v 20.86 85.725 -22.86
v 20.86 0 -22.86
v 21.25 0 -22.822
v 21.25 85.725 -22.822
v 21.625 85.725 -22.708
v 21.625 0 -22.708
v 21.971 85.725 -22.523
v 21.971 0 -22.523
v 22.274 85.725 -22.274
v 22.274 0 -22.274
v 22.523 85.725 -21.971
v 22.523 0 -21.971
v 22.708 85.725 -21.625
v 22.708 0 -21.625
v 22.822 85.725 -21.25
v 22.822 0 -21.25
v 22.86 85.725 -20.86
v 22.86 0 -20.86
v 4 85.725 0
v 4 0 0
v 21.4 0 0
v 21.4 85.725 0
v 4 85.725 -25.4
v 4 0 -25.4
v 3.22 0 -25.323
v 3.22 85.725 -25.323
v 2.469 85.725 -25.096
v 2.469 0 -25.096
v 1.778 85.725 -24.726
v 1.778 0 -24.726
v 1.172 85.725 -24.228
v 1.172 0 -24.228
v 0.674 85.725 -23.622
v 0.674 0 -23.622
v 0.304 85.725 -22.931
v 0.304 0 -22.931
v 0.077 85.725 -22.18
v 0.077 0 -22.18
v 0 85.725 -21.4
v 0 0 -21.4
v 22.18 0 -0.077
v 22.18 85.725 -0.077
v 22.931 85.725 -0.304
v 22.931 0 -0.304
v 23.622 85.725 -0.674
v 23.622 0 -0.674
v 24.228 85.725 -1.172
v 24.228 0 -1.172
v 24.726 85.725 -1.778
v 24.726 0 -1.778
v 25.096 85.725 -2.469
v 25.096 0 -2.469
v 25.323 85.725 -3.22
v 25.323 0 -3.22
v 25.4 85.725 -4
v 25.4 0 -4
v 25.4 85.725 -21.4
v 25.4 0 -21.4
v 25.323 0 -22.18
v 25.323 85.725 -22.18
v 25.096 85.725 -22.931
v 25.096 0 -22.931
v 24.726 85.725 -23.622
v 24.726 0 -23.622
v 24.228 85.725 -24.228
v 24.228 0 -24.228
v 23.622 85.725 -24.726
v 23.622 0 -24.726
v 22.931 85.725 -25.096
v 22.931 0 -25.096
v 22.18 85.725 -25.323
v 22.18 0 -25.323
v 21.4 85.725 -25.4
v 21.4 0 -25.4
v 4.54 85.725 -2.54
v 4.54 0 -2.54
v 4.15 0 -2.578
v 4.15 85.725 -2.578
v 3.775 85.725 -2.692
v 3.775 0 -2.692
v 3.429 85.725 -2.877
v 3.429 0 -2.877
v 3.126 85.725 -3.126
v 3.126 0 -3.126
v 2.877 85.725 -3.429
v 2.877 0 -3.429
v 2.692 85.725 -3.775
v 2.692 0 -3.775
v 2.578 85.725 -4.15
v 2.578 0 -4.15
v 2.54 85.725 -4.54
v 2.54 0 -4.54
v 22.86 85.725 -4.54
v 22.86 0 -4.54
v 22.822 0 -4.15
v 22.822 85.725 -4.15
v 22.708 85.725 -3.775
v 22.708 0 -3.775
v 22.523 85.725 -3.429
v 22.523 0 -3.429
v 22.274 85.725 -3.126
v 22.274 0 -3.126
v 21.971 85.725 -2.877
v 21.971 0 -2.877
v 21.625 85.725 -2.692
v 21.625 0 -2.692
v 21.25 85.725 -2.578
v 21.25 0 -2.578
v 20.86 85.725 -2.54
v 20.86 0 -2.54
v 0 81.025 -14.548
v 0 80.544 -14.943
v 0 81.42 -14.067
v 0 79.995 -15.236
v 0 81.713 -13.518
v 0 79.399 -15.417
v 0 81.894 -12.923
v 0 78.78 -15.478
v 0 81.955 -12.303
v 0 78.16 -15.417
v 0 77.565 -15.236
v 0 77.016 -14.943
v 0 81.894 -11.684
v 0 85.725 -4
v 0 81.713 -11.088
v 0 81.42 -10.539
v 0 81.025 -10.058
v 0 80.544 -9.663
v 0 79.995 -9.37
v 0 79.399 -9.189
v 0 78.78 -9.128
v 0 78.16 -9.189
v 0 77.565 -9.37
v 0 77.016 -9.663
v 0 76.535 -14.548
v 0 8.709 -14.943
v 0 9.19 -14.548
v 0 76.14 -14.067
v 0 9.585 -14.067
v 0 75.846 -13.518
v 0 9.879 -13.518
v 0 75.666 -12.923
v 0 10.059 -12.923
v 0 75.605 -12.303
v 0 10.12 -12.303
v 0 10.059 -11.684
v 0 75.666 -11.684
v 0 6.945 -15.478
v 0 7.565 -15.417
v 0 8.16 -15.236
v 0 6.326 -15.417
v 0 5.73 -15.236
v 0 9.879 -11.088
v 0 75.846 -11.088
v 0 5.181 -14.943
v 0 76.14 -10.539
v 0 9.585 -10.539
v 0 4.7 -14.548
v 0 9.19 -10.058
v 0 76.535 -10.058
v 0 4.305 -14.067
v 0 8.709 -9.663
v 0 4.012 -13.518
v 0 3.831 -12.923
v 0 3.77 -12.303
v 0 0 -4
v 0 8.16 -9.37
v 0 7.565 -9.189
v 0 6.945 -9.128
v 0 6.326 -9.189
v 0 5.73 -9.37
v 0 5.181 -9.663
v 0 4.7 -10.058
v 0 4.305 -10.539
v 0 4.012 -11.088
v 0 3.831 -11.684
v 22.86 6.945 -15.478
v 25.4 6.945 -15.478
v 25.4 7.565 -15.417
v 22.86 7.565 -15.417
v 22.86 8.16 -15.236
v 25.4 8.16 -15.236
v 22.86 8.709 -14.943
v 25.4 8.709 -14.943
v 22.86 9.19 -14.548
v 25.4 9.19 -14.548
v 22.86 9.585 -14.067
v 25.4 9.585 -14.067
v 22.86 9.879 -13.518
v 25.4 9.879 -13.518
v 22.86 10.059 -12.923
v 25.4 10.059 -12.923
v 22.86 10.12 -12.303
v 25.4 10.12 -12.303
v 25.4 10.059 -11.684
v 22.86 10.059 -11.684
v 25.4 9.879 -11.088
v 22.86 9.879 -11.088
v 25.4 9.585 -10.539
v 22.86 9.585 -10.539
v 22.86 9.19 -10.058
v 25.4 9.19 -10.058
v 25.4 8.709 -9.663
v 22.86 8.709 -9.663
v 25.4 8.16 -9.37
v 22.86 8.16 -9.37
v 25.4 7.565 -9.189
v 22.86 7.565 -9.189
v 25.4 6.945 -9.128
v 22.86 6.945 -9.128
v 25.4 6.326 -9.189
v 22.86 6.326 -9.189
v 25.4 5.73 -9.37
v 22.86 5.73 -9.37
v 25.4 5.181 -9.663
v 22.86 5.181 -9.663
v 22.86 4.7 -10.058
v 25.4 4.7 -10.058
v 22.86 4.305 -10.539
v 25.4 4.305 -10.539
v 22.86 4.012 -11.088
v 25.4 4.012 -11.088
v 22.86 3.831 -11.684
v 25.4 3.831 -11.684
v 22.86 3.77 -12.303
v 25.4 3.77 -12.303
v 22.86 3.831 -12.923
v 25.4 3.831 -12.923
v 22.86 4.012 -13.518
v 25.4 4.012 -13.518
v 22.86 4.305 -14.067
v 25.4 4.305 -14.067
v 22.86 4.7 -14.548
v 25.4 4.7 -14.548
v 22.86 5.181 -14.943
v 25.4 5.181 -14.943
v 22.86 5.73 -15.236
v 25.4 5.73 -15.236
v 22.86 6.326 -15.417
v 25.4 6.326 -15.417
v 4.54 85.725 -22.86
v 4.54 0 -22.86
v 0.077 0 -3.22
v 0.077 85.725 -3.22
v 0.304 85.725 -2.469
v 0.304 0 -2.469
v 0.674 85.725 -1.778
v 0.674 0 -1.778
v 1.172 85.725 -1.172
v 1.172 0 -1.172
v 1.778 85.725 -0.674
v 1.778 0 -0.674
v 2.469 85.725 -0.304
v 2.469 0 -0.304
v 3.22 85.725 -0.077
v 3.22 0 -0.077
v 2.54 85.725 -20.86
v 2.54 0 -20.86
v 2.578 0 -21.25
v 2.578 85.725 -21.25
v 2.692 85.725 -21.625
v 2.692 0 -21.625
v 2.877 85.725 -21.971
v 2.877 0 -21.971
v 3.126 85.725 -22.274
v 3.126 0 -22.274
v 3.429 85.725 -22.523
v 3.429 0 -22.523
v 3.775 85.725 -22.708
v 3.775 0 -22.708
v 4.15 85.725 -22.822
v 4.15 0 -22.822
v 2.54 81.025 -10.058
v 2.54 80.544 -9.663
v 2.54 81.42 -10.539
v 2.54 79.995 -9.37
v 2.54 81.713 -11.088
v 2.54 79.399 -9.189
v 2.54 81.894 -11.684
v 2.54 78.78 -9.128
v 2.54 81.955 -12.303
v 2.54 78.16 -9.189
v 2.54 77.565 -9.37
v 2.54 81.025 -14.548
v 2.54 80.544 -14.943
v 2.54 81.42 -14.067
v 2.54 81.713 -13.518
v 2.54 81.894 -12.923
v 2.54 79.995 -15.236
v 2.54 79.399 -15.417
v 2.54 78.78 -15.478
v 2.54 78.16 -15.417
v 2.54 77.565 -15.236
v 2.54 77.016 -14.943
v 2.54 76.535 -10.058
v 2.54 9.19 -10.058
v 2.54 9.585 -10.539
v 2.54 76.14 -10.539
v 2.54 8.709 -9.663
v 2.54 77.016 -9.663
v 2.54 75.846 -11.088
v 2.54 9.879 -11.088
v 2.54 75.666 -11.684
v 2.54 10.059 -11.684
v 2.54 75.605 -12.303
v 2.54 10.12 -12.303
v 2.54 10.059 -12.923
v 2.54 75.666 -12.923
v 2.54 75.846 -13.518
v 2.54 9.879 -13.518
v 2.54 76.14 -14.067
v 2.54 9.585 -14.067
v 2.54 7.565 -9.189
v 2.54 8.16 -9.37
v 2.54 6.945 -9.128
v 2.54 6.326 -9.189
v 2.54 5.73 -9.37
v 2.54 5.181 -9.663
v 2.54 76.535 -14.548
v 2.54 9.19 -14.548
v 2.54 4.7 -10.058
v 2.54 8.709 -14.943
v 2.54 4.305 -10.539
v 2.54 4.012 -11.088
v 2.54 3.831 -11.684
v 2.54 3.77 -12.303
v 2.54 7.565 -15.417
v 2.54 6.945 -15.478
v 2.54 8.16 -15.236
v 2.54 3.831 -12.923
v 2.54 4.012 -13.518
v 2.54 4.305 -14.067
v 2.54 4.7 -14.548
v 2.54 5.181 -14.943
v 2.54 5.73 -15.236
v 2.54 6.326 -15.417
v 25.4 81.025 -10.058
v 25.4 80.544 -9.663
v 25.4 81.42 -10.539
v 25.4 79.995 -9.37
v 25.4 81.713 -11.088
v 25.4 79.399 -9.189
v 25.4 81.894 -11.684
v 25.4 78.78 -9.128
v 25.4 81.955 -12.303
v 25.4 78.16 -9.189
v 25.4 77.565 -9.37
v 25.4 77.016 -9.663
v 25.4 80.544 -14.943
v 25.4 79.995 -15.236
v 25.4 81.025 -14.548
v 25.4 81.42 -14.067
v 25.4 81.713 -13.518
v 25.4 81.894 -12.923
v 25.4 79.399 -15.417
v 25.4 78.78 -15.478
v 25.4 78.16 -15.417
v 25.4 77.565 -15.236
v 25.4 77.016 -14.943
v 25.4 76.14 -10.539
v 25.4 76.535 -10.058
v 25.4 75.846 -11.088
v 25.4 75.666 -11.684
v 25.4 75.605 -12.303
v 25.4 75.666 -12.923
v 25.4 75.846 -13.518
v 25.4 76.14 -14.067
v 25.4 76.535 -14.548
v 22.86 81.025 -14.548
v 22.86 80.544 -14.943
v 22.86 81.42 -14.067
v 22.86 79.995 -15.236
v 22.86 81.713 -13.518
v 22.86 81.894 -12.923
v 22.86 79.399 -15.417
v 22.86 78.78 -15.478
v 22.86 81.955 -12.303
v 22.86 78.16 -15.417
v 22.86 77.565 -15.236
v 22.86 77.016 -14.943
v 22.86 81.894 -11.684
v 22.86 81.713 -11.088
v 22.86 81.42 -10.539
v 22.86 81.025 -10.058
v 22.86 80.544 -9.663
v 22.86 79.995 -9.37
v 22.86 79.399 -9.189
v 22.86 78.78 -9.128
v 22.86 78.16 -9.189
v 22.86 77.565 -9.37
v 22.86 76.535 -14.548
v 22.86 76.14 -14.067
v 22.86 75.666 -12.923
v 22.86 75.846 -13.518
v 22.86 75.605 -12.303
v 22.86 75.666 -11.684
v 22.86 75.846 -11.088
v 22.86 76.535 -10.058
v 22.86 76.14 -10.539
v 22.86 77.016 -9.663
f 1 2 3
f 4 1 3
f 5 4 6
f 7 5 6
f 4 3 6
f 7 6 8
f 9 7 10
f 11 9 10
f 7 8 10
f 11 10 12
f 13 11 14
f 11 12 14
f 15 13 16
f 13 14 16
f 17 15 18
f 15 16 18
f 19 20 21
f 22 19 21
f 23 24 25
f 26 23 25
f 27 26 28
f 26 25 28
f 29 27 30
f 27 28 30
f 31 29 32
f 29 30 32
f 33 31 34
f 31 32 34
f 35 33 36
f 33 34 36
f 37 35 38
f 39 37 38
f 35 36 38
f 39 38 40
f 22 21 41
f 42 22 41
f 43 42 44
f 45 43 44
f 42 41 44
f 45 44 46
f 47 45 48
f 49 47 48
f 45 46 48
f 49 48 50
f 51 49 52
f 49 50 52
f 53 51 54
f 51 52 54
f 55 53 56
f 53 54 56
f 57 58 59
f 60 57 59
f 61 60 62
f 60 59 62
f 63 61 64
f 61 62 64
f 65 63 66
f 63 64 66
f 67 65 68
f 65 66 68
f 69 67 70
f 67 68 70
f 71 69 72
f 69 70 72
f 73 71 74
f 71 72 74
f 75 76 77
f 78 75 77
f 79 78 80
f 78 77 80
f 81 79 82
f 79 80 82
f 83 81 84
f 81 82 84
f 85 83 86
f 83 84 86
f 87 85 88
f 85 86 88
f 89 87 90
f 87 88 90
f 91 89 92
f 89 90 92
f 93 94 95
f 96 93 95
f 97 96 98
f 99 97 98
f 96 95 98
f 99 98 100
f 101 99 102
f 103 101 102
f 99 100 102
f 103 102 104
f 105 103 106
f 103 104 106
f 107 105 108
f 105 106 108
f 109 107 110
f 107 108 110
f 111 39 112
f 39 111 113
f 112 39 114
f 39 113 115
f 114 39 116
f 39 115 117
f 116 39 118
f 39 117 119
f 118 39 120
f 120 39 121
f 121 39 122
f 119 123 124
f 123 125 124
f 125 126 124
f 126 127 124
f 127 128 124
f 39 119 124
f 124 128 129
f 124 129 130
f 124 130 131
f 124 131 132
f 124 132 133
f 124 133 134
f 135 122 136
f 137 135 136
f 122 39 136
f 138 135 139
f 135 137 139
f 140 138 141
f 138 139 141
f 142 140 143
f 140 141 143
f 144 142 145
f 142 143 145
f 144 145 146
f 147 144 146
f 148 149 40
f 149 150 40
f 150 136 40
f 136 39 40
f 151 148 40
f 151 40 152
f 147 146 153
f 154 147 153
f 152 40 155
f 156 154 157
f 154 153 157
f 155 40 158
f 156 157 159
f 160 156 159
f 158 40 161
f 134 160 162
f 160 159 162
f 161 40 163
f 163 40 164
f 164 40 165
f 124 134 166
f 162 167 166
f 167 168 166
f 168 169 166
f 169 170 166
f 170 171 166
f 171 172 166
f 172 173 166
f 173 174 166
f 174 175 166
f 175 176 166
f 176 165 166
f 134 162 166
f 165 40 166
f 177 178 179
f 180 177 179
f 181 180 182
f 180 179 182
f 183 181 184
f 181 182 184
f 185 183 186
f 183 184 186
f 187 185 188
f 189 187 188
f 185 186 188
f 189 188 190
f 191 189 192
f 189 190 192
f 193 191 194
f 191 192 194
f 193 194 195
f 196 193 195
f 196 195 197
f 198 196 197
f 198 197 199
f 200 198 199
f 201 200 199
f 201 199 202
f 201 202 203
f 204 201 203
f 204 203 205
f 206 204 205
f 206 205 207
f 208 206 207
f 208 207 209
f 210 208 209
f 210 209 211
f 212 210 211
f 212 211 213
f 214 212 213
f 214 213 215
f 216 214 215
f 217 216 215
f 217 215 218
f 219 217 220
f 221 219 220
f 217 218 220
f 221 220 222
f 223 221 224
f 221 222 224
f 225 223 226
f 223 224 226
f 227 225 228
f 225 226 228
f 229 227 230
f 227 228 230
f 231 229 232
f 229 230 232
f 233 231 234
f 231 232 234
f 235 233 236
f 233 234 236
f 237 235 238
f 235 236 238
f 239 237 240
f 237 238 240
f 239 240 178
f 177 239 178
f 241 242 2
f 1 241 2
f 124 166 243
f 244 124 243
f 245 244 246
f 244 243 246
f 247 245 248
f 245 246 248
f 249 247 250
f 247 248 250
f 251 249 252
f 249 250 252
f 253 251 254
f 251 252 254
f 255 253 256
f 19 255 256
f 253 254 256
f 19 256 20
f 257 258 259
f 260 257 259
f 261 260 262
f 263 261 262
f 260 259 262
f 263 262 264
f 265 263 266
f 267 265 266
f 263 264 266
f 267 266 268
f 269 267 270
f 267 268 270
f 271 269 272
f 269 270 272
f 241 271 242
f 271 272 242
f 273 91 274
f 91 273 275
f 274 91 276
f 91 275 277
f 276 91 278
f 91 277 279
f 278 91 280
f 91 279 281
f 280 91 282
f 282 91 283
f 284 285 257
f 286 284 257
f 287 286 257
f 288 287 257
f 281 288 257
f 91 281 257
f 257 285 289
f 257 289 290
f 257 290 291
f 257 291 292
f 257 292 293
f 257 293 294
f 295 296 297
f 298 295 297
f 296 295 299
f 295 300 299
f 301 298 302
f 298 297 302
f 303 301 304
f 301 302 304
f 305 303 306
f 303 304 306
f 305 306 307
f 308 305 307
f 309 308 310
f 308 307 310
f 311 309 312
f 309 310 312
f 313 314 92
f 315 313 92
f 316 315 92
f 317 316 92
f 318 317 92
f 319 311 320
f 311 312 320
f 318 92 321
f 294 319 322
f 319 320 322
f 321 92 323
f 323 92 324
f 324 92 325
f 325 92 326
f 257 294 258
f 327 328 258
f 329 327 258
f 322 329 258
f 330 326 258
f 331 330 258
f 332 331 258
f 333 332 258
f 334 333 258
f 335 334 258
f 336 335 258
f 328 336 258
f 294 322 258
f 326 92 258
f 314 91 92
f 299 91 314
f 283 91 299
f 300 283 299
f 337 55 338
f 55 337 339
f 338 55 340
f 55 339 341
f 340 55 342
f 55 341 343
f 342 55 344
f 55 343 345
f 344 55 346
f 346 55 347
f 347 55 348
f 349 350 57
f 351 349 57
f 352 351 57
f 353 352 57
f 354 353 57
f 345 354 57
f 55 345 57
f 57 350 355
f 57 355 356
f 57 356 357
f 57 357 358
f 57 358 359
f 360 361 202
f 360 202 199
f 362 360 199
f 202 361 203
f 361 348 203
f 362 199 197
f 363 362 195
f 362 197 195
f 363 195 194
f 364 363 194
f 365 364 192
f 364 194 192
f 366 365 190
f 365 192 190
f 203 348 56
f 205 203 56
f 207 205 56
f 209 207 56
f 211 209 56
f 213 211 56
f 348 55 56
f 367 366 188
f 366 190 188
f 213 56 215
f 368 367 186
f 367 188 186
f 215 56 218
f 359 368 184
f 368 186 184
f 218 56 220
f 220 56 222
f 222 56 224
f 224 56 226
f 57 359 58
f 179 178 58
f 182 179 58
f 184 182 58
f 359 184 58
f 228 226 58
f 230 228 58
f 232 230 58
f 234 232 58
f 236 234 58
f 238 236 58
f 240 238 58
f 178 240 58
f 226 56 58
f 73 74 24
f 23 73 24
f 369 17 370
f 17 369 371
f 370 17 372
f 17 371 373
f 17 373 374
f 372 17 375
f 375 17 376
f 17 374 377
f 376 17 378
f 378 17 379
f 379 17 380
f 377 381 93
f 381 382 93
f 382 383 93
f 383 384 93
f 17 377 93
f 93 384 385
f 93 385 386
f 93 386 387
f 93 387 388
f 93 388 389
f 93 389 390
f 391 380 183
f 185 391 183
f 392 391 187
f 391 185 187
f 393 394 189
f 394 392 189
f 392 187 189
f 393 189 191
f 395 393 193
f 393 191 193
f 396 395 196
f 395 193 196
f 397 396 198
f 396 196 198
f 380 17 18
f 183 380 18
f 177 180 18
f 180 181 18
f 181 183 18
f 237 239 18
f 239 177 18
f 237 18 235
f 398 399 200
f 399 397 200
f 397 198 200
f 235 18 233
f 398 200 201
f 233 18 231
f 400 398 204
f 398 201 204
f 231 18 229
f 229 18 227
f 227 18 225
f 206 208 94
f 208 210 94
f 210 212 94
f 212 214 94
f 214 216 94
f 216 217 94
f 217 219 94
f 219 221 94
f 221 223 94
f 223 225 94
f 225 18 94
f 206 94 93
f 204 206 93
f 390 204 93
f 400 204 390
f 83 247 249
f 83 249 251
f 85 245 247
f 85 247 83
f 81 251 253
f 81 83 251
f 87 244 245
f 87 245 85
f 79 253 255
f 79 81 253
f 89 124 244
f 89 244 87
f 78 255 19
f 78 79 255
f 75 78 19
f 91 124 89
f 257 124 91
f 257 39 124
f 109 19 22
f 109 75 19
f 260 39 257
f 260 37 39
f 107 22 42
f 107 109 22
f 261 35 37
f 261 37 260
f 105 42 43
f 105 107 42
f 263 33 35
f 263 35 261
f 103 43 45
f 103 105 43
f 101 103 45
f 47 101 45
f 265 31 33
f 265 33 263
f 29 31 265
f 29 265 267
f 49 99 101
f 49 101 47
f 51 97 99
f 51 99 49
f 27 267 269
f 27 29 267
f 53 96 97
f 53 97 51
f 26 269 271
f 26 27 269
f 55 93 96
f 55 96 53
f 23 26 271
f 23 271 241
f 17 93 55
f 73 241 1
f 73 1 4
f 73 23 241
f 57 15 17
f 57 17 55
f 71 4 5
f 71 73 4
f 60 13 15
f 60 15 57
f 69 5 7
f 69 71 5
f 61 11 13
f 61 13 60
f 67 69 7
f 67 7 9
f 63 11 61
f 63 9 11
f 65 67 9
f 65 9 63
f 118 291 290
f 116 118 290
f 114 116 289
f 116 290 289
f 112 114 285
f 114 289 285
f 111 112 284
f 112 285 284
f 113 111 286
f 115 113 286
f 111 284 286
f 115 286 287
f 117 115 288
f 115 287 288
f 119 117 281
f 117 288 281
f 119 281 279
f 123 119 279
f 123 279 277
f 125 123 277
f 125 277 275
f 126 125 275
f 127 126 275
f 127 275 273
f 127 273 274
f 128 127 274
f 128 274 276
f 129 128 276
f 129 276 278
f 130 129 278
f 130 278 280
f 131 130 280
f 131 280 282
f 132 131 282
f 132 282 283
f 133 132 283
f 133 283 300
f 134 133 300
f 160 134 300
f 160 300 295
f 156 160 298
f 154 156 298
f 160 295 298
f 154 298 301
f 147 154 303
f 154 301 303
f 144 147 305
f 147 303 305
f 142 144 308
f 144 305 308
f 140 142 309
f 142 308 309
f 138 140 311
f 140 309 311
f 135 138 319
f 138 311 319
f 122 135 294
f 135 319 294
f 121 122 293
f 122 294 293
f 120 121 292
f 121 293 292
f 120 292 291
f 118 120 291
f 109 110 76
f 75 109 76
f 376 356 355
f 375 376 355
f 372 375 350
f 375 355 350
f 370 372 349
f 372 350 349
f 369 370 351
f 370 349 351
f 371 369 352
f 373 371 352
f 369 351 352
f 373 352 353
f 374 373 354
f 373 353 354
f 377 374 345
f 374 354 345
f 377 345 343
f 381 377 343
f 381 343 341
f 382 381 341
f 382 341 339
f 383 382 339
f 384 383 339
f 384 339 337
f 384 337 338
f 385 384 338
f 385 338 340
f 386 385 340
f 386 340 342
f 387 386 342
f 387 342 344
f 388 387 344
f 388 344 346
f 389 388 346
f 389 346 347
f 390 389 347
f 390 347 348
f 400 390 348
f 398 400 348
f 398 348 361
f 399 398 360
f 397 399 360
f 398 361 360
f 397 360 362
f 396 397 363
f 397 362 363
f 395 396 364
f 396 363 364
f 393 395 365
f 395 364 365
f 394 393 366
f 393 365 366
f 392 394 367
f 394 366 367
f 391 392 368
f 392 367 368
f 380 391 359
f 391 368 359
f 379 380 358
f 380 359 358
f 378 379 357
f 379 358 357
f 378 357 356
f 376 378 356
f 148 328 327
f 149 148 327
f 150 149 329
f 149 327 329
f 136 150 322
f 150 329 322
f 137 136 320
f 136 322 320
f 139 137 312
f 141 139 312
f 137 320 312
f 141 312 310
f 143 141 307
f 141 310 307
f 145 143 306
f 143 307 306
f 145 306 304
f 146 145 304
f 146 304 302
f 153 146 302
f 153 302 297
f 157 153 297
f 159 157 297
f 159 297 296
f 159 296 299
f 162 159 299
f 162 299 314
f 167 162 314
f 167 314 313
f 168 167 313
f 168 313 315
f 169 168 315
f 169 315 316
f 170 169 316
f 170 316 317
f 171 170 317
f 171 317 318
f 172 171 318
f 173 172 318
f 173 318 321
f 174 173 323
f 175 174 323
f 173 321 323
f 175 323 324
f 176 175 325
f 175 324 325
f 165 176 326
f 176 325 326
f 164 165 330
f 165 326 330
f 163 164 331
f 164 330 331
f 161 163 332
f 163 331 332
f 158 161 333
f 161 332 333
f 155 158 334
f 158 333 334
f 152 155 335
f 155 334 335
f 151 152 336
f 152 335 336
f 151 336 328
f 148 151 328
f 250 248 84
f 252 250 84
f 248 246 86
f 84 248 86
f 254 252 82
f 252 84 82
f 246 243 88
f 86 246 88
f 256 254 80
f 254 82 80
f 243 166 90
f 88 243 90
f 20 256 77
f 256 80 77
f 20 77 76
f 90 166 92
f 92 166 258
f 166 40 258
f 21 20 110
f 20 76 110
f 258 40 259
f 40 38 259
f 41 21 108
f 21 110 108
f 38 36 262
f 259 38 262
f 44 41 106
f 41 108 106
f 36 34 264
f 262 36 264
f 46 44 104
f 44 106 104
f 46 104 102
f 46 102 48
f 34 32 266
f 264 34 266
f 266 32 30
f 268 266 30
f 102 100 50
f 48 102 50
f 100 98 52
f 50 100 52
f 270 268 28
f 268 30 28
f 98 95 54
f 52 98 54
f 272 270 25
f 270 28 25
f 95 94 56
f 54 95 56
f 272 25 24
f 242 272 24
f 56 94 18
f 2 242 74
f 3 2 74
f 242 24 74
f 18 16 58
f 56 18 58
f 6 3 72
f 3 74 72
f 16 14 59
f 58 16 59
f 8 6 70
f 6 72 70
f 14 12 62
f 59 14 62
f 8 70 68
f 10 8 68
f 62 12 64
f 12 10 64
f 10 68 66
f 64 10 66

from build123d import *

# Parameters (mm, degrees)
BOSS_EXTRUDE1_DEPTH     = 85.725
SKETCH2_R               = 3.175
CUT_EXTRUDE1_DEPTH      = 1
CUT_EXTRUDE1_DEPTH_BACK = 26.4


with BuildPart() as part:
    # Sketch1 → Boss-Extrude1 (new body)
    with BuildSketch(Plane(origin=(0, 0, 0), x_dir=(1, 0, 0), z_dir=(0, 1, 0))):
        with BuildLine():
            Line((4, 0), (21.4, 0))
            ThreePointArc((21.4, 0), (24.228427125, 1.171572875), (25.4, 4))
            Line((25.4, 4), (25.4, 21.4))
            ThreePointArc((25.4, 21.4), (24.228427125, 24.228427125), (21.4, 25.4))
            Line((21.4, 25.4), (4, 25.4))
            ThreePointArc((4, 25.4), (1.171572875, 24.228427125), (0, 21.4))
            Line((0, 21.4), (0, 4))
            ThreePointArc((0, 4), (1.171572875, 1.171572875), (4, 0))
        make_face()
        with BuildLine():
            Line((20.86, 2.54), (4.54, 2.54))
            ThreePointArc((4.54, 2.54), (3.125786438, 3.125786438), (2.54, 4.54))
            Line((2.54, 4.54), (2.54, 20.86))
            ThreePointArc((2.54, 20.86), (3.125786438, 22.274213562), (4.54, 22.86))
            Line((4.54, 22.86), (20.86, 22.86))
            ThreePointArc((20.86, 22.86), (22.274213562, 22.274213562), (22.86, 20.86))
            Line((22.86, 20.86), (22.86, 4.54))
            ThreePointArc((22.86, 4.54), (22.274213562, 3.125786438), (20.86, 2.54))
        make_face(mode=Mode.SUBTRACT)
    extrude(amount=BOSS_EXTRUDE1_DEPTH)

    # Sketch2 → Cut-Extrude1 (cut, two sides)
    with BuildSketch(Plane(origin=(25.4, 0, 0), x_dir=(0, 0, -1), z_dir=(1, 0, 0))) as cut_extrude1_sk:
        with Locations((12.303125, 6.9453125)):
            Circle(SKETCH2_R)
        with Locations((12.303125, 78.7796875)):
            Circle(SKETCH2_R)
    extrude(amount=CUT_EXTRUDE1_DEPTH, mode=Mode.SUBTRACT)
    extrude(cut_extrude1_sk.sketch, amount=-CUT_EXTRUDE1_DEPTH_BACK, mode=Mode.SUBTRACT)


solid = part.part
